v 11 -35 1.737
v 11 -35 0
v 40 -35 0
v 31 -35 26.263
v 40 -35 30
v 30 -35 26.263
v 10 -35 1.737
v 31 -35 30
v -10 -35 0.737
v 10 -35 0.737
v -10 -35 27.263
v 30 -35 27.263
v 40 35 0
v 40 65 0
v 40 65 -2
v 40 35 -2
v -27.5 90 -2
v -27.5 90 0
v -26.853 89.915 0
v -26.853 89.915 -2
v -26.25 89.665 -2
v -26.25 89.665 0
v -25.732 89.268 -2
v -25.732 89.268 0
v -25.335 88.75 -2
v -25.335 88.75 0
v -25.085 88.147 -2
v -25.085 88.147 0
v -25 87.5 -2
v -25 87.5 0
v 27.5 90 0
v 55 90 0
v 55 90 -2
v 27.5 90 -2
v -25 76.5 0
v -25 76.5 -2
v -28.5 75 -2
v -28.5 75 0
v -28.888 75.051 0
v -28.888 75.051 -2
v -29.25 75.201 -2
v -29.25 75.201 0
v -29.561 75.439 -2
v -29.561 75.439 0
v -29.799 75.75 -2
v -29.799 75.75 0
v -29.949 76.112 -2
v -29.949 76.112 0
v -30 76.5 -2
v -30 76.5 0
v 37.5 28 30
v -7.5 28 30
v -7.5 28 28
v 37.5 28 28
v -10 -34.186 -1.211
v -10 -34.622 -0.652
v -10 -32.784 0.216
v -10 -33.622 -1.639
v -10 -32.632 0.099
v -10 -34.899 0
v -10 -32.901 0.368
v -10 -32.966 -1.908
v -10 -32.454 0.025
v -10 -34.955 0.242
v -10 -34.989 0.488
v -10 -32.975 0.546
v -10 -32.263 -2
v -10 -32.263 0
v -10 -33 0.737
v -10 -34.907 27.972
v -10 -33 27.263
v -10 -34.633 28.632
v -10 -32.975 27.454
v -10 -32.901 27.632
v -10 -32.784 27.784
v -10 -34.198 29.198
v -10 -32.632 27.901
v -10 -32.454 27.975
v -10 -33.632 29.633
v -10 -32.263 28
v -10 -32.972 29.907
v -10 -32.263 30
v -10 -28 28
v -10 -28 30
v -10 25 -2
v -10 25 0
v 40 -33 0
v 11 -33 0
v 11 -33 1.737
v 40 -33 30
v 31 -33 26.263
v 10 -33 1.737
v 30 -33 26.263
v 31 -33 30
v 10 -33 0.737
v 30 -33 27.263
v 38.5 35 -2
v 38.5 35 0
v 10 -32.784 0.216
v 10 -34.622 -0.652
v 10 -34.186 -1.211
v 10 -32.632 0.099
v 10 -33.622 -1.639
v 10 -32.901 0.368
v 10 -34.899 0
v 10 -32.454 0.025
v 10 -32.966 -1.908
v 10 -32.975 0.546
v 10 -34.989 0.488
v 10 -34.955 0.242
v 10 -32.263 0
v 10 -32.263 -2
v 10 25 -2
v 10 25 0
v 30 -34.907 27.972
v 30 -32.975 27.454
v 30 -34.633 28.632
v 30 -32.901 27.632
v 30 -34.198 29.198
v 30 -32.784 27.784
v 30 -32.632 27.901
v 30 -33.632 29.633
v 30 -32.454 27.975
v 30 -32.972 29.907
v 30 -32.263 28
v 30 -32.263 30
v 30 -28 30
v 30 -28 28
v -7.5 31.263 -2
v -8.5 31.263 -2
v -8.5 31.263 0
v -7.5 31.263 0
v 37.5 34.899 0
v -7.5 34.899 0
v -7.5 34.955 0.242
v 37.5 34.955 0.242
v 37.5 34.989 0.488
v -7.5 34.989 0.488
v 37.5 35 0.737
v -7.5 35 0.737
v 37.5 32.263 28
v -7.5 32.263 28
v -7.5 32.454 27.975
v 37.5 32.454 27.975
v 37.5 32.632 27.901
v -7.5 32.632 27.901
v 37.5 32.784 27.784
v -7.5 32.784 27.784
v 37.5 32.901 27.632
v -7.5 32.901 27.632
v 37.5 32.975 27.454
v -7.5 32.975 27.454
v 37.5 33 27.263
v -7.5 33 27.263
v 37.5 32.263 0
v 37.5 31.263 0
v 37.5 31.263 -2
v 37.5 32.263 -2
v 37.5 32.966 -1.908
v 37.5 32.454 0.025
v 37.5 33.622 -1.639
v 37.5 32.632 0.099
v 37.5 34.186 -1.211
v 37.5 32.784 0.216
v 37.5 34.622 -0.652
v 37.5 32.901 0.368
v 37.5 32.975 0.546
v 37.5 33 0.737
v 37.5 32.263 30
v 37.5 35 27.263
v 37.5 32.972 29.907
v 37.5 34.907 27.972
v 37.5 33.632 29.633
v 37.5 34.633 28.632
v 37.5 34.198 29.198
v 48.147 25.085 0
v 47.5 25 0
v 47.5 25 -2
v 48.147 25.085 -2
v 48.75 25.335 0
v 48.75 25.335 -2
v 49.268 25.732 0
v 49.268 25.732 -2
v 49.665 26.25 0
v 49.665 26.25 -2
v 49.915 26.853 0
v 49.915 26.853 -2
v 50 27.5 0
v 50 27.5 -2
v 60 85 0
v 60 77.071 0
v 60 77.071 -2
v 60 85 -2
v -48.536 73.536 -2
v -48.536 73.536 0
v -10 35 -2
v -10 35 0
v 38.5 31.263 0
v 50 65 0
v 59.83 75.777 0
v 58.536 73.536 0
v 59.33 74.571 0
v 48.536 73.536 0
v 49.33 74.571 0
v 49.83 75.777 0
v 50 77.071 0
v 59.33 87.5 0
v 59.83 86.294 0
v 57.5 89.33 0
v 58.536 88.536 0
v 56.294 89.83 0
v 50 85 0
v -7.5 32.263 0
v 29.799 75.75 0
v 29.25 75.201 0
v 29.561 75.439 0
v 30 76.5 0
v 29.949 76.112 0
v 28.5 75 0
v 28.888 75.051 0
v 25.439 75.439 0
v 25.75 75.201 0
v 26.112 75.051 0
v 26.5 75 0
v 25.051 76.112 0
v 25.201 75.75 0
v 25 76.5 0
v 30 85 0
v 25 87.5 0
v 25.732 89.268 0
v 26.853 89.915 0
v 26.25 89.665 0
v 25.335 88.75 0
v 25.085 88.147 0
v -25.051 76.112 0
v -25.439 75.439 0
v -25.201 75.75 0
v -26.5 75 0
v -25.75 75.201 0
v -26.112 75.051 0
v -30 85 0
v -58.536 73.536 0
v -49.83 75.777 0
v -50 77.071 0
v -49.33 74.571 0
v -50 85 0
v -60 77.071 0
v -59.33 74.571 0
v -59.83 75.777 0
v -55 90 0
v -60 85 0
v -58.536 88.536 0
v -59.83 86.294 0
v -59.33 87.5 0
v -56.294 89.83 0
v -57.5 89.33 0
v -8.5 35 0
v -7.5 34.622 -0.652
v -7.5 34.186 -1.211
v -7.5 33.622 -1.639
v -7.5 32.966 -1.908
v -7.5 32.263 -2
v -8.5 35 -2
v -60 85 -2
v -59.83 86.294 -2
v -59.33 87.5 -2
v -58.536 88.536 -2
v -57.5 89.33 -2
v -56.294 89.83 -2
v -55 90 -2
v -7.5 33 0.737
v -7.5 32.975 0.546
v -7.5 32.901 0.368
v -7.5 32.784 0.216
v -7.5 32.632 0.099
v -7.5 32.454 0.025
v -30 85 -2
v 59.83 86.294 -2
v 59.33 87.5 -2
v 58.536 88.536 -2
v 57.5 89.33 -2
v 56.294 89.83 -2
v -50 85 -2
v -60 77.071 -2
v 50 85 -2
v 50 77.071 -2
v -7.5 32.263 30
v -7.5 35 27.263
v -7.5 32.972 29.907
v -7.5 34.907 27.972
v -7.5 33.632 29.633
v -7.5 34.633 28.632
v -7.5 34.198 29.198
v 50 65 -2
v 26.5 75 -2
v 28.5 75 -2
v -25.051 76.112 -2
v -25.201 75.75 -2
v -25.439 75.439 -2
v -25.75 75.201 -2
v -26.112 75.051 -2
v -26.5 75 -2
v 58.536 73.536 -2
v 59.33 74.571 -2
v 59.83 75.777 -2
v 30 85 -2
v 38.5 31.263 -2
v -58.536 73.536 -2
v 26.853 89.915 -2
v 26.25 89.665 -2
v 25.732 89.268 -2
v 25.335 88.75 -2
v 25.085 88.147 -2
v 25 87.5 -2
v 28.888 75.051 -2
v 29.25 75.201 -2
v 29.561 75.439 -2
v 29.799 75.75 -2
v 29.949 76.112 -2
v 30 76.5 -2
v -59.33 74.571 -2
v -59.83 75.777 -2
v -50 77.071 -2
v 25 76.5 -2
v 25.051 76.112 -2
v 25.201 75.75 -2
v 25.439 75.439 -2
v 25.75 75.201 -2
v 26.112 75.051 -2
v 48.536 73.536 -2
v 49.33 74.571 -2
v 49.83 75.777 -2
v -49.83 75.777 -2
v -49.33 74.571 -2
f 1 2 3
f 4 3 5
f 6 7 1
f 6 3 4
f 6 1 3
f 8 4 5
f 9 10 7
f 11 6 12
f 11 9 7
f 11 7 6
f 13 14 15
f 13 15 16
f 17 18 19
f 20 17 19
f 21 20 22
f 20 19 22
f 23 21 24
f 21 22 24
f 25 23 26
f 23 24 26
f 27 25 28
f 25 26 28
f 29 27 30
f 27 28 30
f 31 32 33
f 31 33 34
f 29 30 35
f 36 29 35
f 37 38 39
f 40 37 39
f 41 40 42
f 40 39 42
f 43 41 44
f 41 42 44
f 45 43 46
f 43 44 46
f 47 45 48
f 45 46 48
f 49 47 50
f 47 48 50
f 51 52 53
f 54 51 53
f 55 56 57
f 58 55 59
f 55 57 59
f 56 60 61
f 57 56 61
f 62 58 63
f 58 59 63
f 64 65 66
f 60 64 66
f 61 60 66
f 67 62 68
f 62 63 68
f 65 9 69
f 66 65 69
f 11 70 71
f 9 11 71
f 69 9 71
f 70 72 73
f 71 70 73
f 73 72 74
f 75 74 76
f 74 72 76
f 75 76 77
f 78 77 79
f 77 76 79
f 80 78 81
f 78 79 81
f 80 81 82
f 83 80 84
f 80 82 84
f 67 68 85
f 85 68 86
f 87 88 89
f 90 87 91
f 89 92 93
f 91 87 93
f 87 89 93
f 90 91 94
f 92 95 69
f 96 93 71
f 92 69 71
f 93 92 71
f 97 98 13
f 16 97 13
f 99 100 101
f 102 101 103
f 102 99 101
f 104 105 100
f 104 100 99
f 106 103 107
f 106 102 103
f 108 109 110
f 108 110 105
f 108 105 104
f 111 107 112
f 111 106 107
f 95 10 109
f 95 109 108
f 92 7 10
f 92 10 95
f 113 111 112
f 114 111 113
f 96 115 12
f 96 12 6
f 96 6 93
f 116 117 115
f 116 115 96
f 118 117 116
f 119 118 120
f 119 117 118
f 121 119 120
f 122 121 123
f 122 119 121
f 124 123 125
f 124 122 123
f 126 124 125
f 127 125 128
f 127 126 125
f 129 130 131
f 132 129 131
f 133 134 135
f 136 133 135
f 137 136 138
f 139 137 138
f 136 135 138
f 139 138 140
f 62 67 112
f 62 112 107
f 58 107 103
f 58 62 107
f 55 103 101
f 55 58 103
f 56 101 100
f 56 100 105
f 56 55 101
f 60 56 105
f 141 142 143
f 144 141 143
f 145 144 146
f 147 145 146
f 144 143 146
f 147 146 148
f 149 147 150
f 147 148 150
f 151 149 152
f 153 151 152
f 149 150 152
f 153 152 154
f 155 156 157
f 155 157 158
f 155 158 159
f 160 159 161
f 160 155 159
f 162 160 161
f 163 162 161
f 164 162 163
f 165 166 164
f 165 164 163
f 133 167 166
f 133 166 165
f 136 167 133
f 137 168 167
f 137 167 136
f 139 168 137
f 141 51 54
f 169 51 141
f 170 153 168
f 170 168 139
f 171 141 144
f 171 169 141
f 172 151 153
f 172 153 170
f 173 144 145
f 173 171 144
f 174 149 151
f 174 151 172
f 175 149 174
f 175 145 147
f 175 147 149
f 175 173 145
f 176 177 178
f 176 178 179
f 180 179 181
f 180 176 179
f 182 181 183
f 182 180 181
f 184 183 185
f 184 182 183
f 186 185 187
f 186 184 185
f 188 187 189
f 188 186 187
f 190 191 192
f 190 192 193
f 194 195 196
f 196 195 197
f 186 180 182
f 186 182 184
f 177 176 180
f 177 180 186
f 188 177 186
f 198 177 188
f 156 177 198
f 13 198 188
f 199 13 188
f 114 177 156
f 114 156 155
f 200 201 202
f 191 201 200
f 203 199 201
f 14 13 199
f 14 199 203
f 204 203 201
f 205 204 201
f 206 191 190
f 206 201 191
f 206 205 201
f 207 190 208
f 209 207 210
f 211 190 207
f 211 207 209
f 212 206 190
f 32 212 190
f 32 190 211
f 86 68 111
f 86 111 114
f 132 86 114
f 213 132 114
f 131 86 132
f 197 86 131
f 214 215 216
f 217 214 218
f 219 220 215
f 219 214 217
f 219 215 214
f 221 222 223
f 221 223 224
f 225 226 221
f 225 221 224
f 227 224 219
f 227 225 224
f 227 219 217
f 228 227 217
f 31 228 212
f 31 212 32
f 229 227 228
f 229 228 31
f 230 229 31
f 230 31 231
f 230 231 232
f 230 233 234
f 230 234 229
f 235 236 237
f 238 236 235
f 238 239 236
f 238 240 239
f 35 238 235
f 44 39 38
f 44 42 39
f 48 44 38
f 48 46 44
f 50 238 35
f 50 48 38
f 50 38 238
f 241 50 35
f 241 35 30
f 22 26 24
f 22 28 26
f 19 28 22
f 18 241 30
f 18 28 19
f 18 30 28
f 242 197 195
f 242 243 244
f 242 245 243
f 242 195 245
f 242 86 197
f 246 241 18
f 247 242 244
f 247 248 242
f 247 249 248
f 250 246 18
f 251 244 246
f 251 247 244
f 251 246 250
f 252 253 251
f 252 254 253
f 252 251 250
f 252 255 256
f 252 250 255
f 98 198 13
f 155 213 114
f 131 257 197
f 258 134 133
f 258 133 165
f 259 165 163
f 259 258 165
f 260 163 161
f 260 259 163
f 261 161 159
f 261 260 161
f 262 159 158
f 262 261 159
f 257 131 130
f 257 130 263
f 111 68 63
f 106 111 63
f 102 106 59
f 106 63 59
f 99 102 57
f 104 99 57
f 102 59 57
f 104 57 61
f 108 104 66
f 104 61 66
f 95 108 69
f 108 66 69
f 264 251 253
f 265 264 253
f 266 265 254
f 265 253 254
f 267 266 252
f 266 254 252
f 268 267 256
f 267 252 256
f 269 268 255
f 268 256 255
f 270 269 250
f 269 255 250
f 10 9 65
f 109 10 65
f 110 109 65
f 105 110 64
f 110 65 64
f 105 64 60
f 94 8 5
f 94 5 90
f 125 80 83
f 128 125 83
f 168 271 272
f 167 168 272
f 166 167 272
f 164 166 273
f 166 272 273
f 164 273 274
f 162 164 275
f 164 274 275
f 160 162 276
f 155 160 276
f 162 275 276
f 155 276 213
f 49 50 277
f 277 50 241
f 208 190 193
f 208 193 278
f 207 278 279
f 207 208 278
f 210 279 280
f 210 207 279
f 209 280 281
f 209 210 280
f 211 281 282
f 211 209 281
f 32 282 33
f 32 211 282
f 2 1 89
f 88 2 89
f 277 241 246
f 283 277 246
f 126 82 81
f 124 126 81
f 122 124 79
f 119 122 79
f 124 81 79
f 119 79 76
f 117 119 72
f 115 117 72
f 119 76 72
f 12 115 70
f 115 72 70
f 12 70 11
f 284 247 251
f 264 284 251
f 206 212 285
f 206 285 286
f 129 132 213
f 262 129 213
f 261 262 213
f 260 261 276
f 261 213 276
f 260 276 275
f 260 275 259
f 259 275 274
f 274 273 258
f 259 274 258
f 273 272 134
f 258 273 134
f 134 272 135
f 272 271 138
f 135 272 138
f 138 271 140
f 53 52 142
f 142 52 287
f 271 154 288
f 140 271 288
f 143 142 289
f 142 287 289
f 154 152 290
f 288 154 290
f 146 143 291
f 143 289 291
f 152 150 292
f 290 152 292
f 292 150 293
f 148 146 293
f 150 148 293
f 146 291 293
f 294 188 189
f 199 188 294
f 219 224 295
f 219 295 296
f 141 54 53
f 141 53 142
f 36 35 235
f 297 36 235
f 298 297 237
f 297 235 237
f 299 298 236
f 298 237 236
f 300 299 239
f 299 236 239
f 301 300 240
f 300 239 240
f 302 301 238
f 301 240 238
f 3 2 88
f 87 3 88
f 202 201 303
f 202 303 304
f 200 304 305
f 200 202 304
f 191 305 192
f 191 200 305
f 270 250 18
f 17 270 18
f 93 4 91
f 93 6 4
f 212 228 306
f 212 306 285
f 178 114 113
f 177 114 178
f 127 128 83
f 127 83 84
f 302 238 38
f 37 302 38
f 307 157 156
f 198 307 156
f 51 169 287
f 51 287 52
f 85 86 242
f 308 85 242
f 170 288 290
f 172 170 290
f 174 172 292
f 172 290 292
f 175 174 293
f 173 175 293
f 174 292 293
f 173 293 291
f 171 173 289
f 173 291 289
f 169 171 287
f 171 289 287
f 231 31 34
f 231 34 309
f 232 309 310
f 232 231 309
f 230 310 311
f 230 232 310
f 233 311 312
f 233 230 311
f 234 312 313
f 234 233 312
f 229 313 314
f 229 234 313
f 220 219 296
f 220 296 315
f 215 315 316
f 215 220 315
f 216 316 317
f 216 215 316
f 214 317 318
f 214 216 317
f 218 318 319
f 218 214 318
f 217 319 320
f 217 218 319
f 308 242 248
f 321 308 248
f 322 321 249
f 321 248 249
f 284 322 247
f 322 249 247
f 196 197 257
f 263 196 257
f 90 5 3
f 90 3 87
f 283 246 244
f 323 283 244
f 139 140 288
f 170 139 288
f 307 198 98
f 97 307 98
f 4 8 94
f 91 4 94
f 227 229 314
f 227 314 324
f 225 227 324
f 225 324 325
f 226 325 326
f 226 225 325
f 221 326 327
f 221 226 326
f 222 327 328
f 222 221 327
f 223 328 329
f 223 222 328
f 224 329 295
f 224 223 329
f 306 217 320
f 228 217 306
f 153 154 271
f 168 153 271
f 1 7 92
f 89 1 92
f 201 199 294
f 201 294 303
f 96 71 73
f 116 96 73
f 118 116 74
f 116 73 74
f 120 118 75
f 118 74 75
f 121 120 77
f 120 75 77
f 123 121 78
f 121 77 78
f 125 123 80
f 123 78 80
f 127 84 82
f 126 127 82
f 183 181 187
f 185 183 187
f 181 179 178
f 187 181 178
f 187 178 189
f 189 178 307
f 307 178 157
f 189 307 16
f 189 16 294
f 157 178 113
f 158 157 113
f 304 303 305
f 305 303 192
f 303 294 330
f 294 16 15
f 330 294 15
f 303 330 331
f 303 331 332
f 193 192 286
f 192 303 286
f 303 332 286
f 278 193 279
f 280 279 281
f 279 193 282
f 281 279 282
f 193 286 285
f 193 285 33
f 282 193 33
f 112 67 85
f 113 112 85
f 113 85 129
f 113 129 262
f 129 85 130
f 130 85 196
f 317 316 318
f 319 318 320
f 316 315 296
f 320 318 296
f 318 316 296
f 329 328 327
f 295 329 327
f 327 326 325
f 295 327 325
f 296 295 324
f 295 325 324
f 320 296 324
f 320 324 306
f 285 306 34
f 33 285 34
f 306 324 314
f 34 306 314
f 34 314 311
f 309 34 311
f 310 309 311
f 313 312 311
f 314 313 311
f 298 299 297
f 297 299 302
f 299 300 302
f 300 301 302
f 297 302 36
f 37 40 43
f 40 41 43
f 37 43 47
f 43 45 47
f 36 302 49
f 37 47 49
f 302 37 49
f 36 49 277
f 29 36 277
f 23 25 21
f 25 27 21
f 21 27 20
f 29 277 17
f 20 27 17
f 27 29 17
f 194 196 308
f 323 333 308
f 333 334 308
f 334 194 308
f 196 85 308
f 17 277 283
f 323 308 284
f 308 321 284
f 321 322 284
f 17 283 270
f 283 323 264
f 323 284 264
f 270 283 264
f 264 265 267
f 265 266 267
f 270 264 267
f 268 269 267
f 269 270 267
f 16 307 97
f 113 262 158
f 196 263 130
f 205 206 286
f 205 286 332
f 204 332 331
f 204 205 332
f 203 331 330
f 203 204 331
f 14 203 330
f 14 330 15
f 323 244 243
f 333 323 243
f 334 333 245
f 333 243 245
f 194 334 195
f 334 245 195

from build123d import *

# Parameters (mm, degrees)
BOSS_EXTRUDE1_DEPTH          = 2
BOSS_EXTRUDE1_2_DEPTH        = 2
BASE_W                       = 20
BASE_H                       = 70
BOSS_EXTRUDE2_DEPTH          = 2
F_3_CM_HANG_LOWER_W          = 50
F_3_CM_HANG_LOWER_H          = 30
BOSS_EXTRUDE3_DEPTH          = 2
F_3CM_HANG_UPPER_W           = 45
F_3CM_HANG_UPPER_H           = 30
BOSS_EXTRUDE4_DEPTH          = 2
LOWER_HOLDER_2ND_EXTEND_W    = 40
LOWER_HOLDER_2ND_EXTEND_H    = 5
BOSS_EXTRUDE5_DEPTH          = 2
UPPER_HOLDER_2ND_EXTEND_W    = 45
UPPER_HOLDER_2ND_EXTEND_H    = 5
BOSS_EXTRUDE6_DEPTH          = 2
FLATTEN_BENDS1_START         = -10
FLATTEN_BENDS1_DEPTH         = 50
FLATTEN_BENDS1_START_2       = -8.5
FLATTEN_BENDS1_2_OUTLINE_W   = 3.7366
FLATTEN_BENDS1_2_OUTLINE_H   = 2
FLATTEN_BENDS1_2_DEPTH       = 1
FLATTEN_BENDS1_START_3       = 37.5
FLATTEN_BENDS1_3_OUTLINE_W   = 3.7366
FLATTEN_BENDS1_3_OUTLINE_H   = 2
FLATTEN_BENDS1_3_DEPTH       = 1
FLATTEN_BENDS1_START_4       = -7.5
FLATTEN_BENDS1_4_OUTLINE_W   = 33.509289802
FLATTEN_BENDS1_4_OUTLINE_H   = 2
FLATTEN_BENDS1_4_OUTLINE_W_2 = 24.5268
FLATTEN_BENDS1_4_DEPTH       = 45
FLATTEN_BENDS1_5_OUTLINE_W   = 32.518044901
FLATTEN_BENDS1_5_OUTLINE_H   = 2
FLATTEN_BENDS1_5_DEPTH       = 39.999999999
FLATTEN_BENDS1_START_5       = 11
FLATTEN_BENDS1_6_OUTLINE_W   = 26.2634
FLATTEN_BENDS1_6_OUTLINE_H   = 2
FLATTEN_BENDS1_6_DEPTH       = 29
FLATTEN_BENDS1_START_6       = 31
FLATTEN_BENDS1_7_OUTLINE_W   = 3.7366
FLATTEN_BENDS1_7_OUTLINE_H   = 2
FLATTEN_BENDS1_7_DEPTH       = 9
FLATTEN_BENDS1_8_OUTLINE_W   = 0.991244901
FLATTEN_BENDS1_8_OUTLINE_H   = 2
FLATTEN_BENDS1_8_DEPTH       = 20
PROCESS_BENDS1_START         = -7.5
PROCESS_BENDS1_DEPTH         = 45
PROCESS_BENDS1_START_2       = -10
PROCESS_BENDS1_2_DEPTH       = 50
PROCESS_BENDS1_START_3       = 11
PROCESS_BENDS1_3_DEPTH       = 29
PROCESS_BENDS1_4_OUTLINE_W   = 2
PROCESS_BENDS1_4_OUTLINE_H   = 24.5268
PROCESS_BENDS1_4_DEPTH       = 45
PROCESS_BENDS1_5_DEPTH       = 39.999999999
PROCESS_BENDS1_6_OUTLINE_W   = 2
PROCESS_BENDS1_6_OUTLINE_H   = 26.2634
PROCESS_BENDS1_6_DEPTH       = 29
PROCESS_BENDS1_7_DEPTH       = 20
PROCESS_BENDS1_START_4       = 31
PROCESS_BENDS1_8_OUTLINE_W   = 2
PROCESS_BENDS1_8_OUTLINE_H   = 3.7366
PROCESS_BENDS1_8_DEPTH       = 9


# Read off the part's stored shape, not the designer's step: Flatten-Bends1, Process-Bends1
with BuildPart() as part:
    # hook → Boss-Extrude1 (new body)
    with BuildSketch(Plane.XY):
        with BuildLine():
            Line((-10, 35), (-10, 25))
            Line((-10, 25), (-58.535533906, 73.535533906))
            ThreePointArc((-58.535533906, 73.535533906), (-59.619397663, 75.15765065), (-60, 77.071067812))
            Line((-60, 77.071067812), (-60, 85))
            ThreePointArc((-60, 85), (-58.535533906, 88.535533906), (-55, 90))
            Line((-55, 90), (-27.5, 90))
            ThreePointArc((-27.5, 90), (-25.732233047, 89.267766953), (-25, 87.5))
            Line((-25, 87.5), (-24.999999999, 76.499999999))
            ThreePointArc((-24.999999999, 76.499999999), (-25.439339828, 75.439339828), (-26.499999999, 74.999999999))
            Line((-26.499999999, 74.999999999), (-28.499999999, 74.999999999))
            ThreePointArc((-28.499999999, 74.999999999), (-29.560660171, 75.439339828), (-29.999999999, 76.499999999))
            Line((-29.999999999, 76.499999999), (-29.999999999, 84.999999999))
            Line((-29.999999999, 84.999999999), (-49.999999999, 84.999999999))
            Line((-49.999999999, 84.999999999), (-50, 77.071067812))
            ThreePointArc((-50, 77.071067812), (-49.619397663, 75.15765065), (-48.535533906, 73.535533906))
            Line((-48.535533906, 73.535533906), (-10, 35))
        make_face()
    extrude(amount=-BOSS_EXTRUDE1_DEPTH)



with BuildPart() as body_2:
    # hook → Boss-Extrude1 2 (new body)
    with BuildSketch(Plane.XY):
        with BuildLine():
            Line((48.535533906, 73.535533906), (40, 65))
            Line((40, 65), (40, 35))
            Line((40, 35), (10, 35))
            Line((10, 35), (10, 25))
            Line((10, 25), (47.5, 25))
            ThreePointArc((47.5, 25), (49.267766953, 25.732233047), (50, 27.5))
            Line((50, 27.5), (50, 65))
            Line((50, 65), (58.535533906, 73.535533906))
            ThreePointArc((58.535533906, 73.535533906), (59.619397663, 75.15765065), (60, 77.071067812))
            Line((60, 77.071067812), (60, 85))
            ThreePointArc((60, 85), (58.535533906, 88.535533906), (55, 90))
            Line((55, 90), (27.5, 90))
            ThreePointArc((27.5, 90), (25.732233047, 89.267766953), (25, 87.5))
            Line((25, 87.5), (24.999999999, 76.499999999))
            ThreePointArc((24.999999999, 76.499999999), (25.439339828, 75.439339828), (26.499999999, 74.999999999))
            Line((26.499999999, 74.999999999), (28.499999999, 74.999999999))
            ThreePointArc((28.499999999, 74.999999999), (29.560660171, 75.439339828), (29.999999999, 76.499999999))
            Line((29.999999999, 76.499999999), (29.999999999, 84.999999999))
            Line((29.999999999, 84.999999999), (49.999999999, 84.999999999))
            Line((49.999999999, 84.999999999), (50, 77.071067812))
            ThreePointArc((50, 77.071067812), (49.619397663, 75.15765065), (48.535533906, 73.535533906))
        make_face()
    extrude(amount=-BOSS_EXTRUDE1_2_DEPTH)


with BuildPart() as part_1:
    add(part.part)

    add(body_2.part)  # Boss-Extrude2 merges body 2
    # base → Boss-Extrude2 (add)
    with BuildSketch(Plane.XY):
        Rectangle(BASE_W, BASE_H)
    extrude(amount=-BOSS_EXTRUDE2_DEPTH)

    # 3cm hang upper → Boss-Extrude4 (add)
    with BuildSketch(Plane(origin=(0, 35, 0), x_dir=(1, 0, 0), z_dir=(0, 1, 0))):
        with Locations((15, -15)):
            Rectangle(F_3CM_HANG_UPPER_W, F_3CM_HANG_UPPER_H)
    extrude(amount=-BOSS_EXTRUDE4_DEPTH)


with BuildPart() as body_2_2:
    # 3 cm hang lower → Boss-Extrude3 (new body)
    with BuildSketch(Plane(origin=(0, -35, 0), x_dir=(1, 0, 0), z_dir=(0, 1, 0))):
        with Locations((15, -15)):
            Rectangle(F_3_CM_HANG_LOWER_W, F_3_CM_HANG_LOWER_H)
    extrude(amount=BOSS_EXTRUDE3_DEPTH)


    add(part_1.part)  # Boss-Extrude5 merges part
    # lower holder 2nd extend → Boss-Extrude5 (add)
    with BuildSketch(Plane.XY.offset(30)):
        with Locations((10, -30.5)):
            Rectangle(LOWER_HOLDER_2ND_EXTEND_W, LOWER_HOLDER_2ND_EXTEND_H)
    extrude(amount=-BOSS_EXTRUDE5_DEPTH)

    # upper holder 2nd extend → Boss-Extrude6 (add)
    with BuildSketch(Plane.XY.offset(30)):
        with Locations((15, 30.5)):
            Rectangle(UPPER_HOLDER_2ND_EXTEND_W, UPPER_HOLDER_2ND_EXTEND_H)
    extrude(amount=-BOSS_EXTRUDE6_DEPTH)

    # Flatten-Bends1 outline → Flatten-Bends1 (cut)
    with BuildSketch(Plane.YZ.offset(FLATTEN_BENDS1_START)):
        Polygon((-33, 0), (-33, 28), (-28, 28), (-28, 30), (-35, 30), (-35, 0), align=None)
        Polygon((33, 28), (33, 0), (35, 0), (35, 30), (28, 30), (28, 28), align=None)
    extrude(amount=FLATTEN_BENDS1_DEPTH, mode=Mode.SUBTRACT)

    # Flatten-Bends1 2 outline → Flatten-Bends1 2 (cut)
    with BuildSketch(Plane.YZ.offset(FLATTEN_BENDS1_START_2)):
        with Locations((33.1317, -1)):
            Rectangle(FLATTEN_BENDS1_2_OUTLINE_W, FLATTEN_BENDS1_2_OUTLINE_H)
    extrude(amount=FLATTEN_BENDS1_2_DEPTH, mode=Mode.SUBTRACT)

    # Flatten-Bends1 3 outline → Flatten-Bends1 3 (cut)
    with BuildSketch(Plane.YZ.offset(FLATTEN_BENDS1_START_3)):
        with Locations((33.1317, -1)):
            Rectangle(FLATTEN_BENDS1_3_OUTLINE_W, FLATTEN_BENDS1_3_OUTLINE_H)
    extrude(amount=FLATTEN_BENDS1_3_DEPTH, mode=Mode.SUBTRACT)

    # Flatten-Bends1 4 outline → Flatten-Bends1 4 (add)
    with BuildSketch(Plane.YZ.offset(FLATTEN_BENDS1_START_4)):
        with Locations((51.754644901, -1)):
            Rectangle(FLATTEN_BENDS1_4_OUTLINE_W, FLATTEN_BENDS1_4_OUTLINE_H)
        with Locations((-48.254644901, -1)):
            Rectangle(FLATTEN_BENDS1_4_OUTLINE_W_2, FLATTEN_BENDS1_4_OUTLINE_H)
    extrude(amount=FLATTEN_BENDS1_4_DEPTH)

    # Flatten-Bends1 5 outline → Flatten-Bends1 5 (add)
    with BuildSketch(Plane.YZ.offset(FLATTEN_BENDS1_START)):
        with Locations((-52.250267351, -1)):
            Rectangle(FLATTEN_BENDS1_5_OUTLINE_W, FLATTEN_BENDS1_5_OUTLINE_H)
    extrude(amount=FLATTEN_BENDS1_5_DEPTH)

    # Flatten-Bends1 6 outline → Flatten-Bends1 6 (add)
    with BuildSketch(Plane.YZ.offset(FLATTEN_BENDS1_START_5)):
        with Locations((-47.386344901, -1)):
            Rectangle(FLATTEN_BENDS1_6_OUTLINE_W, FLATTEN_BENDS1_6_OUTLINE_H)
    extrude(amount=FLATTEN_BENDS1_6_DEPTH)

    # Flatten-Bends1 7 outline → Flatten-Bends1 7 (add)
    with BuildSketch(Plane.YZ.offset(FLATTEN_BENDS1_START_6)):
        with Locations((-62.386344901, -1)):
            Rectangle(FLATTEN_BENDS1_7_OUTLINE_W, FLATTEN_BENDS1_7_OUTLINE_H)
    extrude(amount=FLATTEN_BENDS1_7_DEPTH)

    # Flatten-Bends1 8 outline → Flatten-Bends1 8 (add)
    with BuildSketch(Plane.YZ.offset(FLATTEN_BENDS1_START)):
        with Locations((-35.495622451, -1)):
            Rectangle(FLATTEN_BENDS1_8_OUTLINE_W, FLATTEN_BENDS1_8_OUTLINE_H)
    extrude(amount=FLATTEN_BENDS1_8_DEPTH)

    # Process-Bends1 outline → Process-Bends1 (cut)
    with BuildSketch(Plane.YZ.offset(PROCESS_BENDS1_START)):
        with BuildLine():
            Line((68.509289802, 0), (34.899002398, 0))
            ThreePointArc((34.899002398, 0), (33.917667209, -1.443395312), (32.2634, -2))
            Line((32.2634, -2), (68.509289802, -2))
            Line((68.509289802, -2), (68.509289802, 0))
        make_face()
        with BuildLine():
            Line((-68.509289802, 0), (-68.509289802, -2))
            Line((-68.509289802, -2), (-32.2634, -2))
            ThreePointArc((-32.2634, -2), (-33.917667209, -1.443395312), (-34.899002398, 0))
            Line((-34.899002398, 0), (-68.509289802, 0))
        make_face()
    extrude(amount=PROCESS_BENDS1_DEPTH, mode=Mode.SUBTRACT)

    # Process-Bends1 2 outline → Process-Bends1 2 (cut)
    with BuildSketch(Plane.YZ.offset(PROCESS_BENDS1_START_2)):
        with BuildLine():
            Line((-68.509289802, 0), (-68.509289802, -2))
            Line((-68.509289802, -2), (-32.2634, -2))
            ThreePointArc((-32.2634, -2), (-33.917667209, -1.443395312), (-34.899002398, 0))
            Line((-34.899002398, 0), (-68.509289802, 0))
        make_face()
    extrude(amount=PROCESS_BENDS1_2_DEPTH, mode=Mode.SUBTRACT)

    # Process-Bends1 3 outline → Process-Bends1 3 (cut)
    with BuildSketch(Plane.YZ.offset(PROCESS_BENDS1_START_3)):
        with BuildLine():
            Line((-34.254644901, 0), (-34.899002398, 0))
            ThreePointArc((-34.899002398, 0), (-34.646082873, -0.609431903), (-34.254644901, -1.140611576))
            Line((-34.254644901, -1.140611576), (-34.254644901, 0))
        make_face()
    extrude(amount=PROCESS_BENDS1_3_DEPTH, mode=Mode.SUBTRACT)

    # Process-Bends1 4 outline → Process-Bends1 4 (add)
    with BuildSketch(Plane.YZ.offset(PROCESS_BENDS1_START)):
        with BuildLine():
            Line((32.2634, 30), (28, 30))
            Line((28, 30), (28, 28))
            Line((28, 28), (32.2634, 28))
            ThreePointArc((32.2634, 28), (32.784254855, 27.784254855), (33, 27.2634))
            Line((33, 27.2634), (33, 0.7366))
            ThreePointArc((33, 0.7366), (32.784254855, 0.215745145), (32.2634, 0))
            Line((32.2634, 0), (34.899002398, 0))
            ThreePointArc((34.899002398, 0), (34.974633029, 0.364854094), (35, 0.7366))
            Line((35, 0.7366), (35, 27.2634))
            ThreePointArc((35, 27.2634), (34.198468417, 29.198468417), (32.2634, 30))
        make_face()
        with Locations((-34, 14)):
            Rectangle(PROCESS_BENDS1_4_OUTLINE_W, PROCESS_BENDS1_4_OUTLINE_H)
    extrude(amount=PROCESS_BENDS1_4_DEPTH)

    # Process-Bends1 5 outline → Process-Bends1 5 (add)
    with BuildSketch(Plane.YZ.offset(PROCESS_BENDS1_START_2)):
        with BuildLine():
            Line((-28, 30), (-32.2634, 30))
            ThreePointArc((-32.2634, 30), (-34.198468417, 29.198468417), (-35, 27.2634))
            Line((-35, 27.2634), (-35, 1.7366))
            Line((-35, 1.7366), (-33, 1.7366))
            Line((-33, 1.7366), (-33, 27.2634))
            ThreePointArc((-33, 27.2634), (-32.784254855, 27.784254855), (-32.2634, 28))
            Line((-32.2634, 28), (-28, 28))
            Line((-28, 28), (-28, 30))
        make_face()
    extrude(amount=PROCESS_BENDS1_5_DEPTH)

    # Process-Bends1 6 outline → Process-Bends1 6 (add)
    with BuildSketch(Plane.YZ.offset(PROCESS_BENDS1_START_3)):
        with Locations((-34, 13.1317)):
            Rectangle(PROCESS_BENDS1_6_OUTLINE_W, PROCESS_BENDS1_6_OUTLINE_H)
    extrude(amount=PROCESS_BENDS1_6_DEPTH)

    # Process-Bends1 7 outline → Process-Bends1 7 (add)
    with BuildSketch(Plane.YZ.offset(PROCESS_BENDS1_START_2)):
        with BuildLine():
            Line((-33, 0.7366), (-33, 1.7366))
            Line((-33, 1.7366), (-35, 1.7366))
            Line((-35, 1.7366), (-35, 0.7366))
            ThreePointArc((-35, 0.7366), (-34.974633029, 0.364854094), (-34.899002398, 0))
            Line((-34.899002398, 0), (-32.2634, 0))
            ThreePointArc((-32.2634, 0), (-32.784254855, 0.215745145), (-33, 0.7366))
        make_face()
    extrude(amount=PROCESS_BENDS1_7_DEPTH)

    # Process-Bends1 8 outline → Process-Bends1 8 (add)
    with BuildSketch(Plane.YZ.offset(PROCESS_BENDS1_START_4)):
        with Locations((-34, 28.1317)):
            Rectangle(PROCESS_BENDS1_8_OUTLINE_W, PROCESS_BENDS1_8_OUTLINE_H)
    extrude(amount=PROCESS_BENDS1_8_DEPTH)


solid = body_2_2.part
